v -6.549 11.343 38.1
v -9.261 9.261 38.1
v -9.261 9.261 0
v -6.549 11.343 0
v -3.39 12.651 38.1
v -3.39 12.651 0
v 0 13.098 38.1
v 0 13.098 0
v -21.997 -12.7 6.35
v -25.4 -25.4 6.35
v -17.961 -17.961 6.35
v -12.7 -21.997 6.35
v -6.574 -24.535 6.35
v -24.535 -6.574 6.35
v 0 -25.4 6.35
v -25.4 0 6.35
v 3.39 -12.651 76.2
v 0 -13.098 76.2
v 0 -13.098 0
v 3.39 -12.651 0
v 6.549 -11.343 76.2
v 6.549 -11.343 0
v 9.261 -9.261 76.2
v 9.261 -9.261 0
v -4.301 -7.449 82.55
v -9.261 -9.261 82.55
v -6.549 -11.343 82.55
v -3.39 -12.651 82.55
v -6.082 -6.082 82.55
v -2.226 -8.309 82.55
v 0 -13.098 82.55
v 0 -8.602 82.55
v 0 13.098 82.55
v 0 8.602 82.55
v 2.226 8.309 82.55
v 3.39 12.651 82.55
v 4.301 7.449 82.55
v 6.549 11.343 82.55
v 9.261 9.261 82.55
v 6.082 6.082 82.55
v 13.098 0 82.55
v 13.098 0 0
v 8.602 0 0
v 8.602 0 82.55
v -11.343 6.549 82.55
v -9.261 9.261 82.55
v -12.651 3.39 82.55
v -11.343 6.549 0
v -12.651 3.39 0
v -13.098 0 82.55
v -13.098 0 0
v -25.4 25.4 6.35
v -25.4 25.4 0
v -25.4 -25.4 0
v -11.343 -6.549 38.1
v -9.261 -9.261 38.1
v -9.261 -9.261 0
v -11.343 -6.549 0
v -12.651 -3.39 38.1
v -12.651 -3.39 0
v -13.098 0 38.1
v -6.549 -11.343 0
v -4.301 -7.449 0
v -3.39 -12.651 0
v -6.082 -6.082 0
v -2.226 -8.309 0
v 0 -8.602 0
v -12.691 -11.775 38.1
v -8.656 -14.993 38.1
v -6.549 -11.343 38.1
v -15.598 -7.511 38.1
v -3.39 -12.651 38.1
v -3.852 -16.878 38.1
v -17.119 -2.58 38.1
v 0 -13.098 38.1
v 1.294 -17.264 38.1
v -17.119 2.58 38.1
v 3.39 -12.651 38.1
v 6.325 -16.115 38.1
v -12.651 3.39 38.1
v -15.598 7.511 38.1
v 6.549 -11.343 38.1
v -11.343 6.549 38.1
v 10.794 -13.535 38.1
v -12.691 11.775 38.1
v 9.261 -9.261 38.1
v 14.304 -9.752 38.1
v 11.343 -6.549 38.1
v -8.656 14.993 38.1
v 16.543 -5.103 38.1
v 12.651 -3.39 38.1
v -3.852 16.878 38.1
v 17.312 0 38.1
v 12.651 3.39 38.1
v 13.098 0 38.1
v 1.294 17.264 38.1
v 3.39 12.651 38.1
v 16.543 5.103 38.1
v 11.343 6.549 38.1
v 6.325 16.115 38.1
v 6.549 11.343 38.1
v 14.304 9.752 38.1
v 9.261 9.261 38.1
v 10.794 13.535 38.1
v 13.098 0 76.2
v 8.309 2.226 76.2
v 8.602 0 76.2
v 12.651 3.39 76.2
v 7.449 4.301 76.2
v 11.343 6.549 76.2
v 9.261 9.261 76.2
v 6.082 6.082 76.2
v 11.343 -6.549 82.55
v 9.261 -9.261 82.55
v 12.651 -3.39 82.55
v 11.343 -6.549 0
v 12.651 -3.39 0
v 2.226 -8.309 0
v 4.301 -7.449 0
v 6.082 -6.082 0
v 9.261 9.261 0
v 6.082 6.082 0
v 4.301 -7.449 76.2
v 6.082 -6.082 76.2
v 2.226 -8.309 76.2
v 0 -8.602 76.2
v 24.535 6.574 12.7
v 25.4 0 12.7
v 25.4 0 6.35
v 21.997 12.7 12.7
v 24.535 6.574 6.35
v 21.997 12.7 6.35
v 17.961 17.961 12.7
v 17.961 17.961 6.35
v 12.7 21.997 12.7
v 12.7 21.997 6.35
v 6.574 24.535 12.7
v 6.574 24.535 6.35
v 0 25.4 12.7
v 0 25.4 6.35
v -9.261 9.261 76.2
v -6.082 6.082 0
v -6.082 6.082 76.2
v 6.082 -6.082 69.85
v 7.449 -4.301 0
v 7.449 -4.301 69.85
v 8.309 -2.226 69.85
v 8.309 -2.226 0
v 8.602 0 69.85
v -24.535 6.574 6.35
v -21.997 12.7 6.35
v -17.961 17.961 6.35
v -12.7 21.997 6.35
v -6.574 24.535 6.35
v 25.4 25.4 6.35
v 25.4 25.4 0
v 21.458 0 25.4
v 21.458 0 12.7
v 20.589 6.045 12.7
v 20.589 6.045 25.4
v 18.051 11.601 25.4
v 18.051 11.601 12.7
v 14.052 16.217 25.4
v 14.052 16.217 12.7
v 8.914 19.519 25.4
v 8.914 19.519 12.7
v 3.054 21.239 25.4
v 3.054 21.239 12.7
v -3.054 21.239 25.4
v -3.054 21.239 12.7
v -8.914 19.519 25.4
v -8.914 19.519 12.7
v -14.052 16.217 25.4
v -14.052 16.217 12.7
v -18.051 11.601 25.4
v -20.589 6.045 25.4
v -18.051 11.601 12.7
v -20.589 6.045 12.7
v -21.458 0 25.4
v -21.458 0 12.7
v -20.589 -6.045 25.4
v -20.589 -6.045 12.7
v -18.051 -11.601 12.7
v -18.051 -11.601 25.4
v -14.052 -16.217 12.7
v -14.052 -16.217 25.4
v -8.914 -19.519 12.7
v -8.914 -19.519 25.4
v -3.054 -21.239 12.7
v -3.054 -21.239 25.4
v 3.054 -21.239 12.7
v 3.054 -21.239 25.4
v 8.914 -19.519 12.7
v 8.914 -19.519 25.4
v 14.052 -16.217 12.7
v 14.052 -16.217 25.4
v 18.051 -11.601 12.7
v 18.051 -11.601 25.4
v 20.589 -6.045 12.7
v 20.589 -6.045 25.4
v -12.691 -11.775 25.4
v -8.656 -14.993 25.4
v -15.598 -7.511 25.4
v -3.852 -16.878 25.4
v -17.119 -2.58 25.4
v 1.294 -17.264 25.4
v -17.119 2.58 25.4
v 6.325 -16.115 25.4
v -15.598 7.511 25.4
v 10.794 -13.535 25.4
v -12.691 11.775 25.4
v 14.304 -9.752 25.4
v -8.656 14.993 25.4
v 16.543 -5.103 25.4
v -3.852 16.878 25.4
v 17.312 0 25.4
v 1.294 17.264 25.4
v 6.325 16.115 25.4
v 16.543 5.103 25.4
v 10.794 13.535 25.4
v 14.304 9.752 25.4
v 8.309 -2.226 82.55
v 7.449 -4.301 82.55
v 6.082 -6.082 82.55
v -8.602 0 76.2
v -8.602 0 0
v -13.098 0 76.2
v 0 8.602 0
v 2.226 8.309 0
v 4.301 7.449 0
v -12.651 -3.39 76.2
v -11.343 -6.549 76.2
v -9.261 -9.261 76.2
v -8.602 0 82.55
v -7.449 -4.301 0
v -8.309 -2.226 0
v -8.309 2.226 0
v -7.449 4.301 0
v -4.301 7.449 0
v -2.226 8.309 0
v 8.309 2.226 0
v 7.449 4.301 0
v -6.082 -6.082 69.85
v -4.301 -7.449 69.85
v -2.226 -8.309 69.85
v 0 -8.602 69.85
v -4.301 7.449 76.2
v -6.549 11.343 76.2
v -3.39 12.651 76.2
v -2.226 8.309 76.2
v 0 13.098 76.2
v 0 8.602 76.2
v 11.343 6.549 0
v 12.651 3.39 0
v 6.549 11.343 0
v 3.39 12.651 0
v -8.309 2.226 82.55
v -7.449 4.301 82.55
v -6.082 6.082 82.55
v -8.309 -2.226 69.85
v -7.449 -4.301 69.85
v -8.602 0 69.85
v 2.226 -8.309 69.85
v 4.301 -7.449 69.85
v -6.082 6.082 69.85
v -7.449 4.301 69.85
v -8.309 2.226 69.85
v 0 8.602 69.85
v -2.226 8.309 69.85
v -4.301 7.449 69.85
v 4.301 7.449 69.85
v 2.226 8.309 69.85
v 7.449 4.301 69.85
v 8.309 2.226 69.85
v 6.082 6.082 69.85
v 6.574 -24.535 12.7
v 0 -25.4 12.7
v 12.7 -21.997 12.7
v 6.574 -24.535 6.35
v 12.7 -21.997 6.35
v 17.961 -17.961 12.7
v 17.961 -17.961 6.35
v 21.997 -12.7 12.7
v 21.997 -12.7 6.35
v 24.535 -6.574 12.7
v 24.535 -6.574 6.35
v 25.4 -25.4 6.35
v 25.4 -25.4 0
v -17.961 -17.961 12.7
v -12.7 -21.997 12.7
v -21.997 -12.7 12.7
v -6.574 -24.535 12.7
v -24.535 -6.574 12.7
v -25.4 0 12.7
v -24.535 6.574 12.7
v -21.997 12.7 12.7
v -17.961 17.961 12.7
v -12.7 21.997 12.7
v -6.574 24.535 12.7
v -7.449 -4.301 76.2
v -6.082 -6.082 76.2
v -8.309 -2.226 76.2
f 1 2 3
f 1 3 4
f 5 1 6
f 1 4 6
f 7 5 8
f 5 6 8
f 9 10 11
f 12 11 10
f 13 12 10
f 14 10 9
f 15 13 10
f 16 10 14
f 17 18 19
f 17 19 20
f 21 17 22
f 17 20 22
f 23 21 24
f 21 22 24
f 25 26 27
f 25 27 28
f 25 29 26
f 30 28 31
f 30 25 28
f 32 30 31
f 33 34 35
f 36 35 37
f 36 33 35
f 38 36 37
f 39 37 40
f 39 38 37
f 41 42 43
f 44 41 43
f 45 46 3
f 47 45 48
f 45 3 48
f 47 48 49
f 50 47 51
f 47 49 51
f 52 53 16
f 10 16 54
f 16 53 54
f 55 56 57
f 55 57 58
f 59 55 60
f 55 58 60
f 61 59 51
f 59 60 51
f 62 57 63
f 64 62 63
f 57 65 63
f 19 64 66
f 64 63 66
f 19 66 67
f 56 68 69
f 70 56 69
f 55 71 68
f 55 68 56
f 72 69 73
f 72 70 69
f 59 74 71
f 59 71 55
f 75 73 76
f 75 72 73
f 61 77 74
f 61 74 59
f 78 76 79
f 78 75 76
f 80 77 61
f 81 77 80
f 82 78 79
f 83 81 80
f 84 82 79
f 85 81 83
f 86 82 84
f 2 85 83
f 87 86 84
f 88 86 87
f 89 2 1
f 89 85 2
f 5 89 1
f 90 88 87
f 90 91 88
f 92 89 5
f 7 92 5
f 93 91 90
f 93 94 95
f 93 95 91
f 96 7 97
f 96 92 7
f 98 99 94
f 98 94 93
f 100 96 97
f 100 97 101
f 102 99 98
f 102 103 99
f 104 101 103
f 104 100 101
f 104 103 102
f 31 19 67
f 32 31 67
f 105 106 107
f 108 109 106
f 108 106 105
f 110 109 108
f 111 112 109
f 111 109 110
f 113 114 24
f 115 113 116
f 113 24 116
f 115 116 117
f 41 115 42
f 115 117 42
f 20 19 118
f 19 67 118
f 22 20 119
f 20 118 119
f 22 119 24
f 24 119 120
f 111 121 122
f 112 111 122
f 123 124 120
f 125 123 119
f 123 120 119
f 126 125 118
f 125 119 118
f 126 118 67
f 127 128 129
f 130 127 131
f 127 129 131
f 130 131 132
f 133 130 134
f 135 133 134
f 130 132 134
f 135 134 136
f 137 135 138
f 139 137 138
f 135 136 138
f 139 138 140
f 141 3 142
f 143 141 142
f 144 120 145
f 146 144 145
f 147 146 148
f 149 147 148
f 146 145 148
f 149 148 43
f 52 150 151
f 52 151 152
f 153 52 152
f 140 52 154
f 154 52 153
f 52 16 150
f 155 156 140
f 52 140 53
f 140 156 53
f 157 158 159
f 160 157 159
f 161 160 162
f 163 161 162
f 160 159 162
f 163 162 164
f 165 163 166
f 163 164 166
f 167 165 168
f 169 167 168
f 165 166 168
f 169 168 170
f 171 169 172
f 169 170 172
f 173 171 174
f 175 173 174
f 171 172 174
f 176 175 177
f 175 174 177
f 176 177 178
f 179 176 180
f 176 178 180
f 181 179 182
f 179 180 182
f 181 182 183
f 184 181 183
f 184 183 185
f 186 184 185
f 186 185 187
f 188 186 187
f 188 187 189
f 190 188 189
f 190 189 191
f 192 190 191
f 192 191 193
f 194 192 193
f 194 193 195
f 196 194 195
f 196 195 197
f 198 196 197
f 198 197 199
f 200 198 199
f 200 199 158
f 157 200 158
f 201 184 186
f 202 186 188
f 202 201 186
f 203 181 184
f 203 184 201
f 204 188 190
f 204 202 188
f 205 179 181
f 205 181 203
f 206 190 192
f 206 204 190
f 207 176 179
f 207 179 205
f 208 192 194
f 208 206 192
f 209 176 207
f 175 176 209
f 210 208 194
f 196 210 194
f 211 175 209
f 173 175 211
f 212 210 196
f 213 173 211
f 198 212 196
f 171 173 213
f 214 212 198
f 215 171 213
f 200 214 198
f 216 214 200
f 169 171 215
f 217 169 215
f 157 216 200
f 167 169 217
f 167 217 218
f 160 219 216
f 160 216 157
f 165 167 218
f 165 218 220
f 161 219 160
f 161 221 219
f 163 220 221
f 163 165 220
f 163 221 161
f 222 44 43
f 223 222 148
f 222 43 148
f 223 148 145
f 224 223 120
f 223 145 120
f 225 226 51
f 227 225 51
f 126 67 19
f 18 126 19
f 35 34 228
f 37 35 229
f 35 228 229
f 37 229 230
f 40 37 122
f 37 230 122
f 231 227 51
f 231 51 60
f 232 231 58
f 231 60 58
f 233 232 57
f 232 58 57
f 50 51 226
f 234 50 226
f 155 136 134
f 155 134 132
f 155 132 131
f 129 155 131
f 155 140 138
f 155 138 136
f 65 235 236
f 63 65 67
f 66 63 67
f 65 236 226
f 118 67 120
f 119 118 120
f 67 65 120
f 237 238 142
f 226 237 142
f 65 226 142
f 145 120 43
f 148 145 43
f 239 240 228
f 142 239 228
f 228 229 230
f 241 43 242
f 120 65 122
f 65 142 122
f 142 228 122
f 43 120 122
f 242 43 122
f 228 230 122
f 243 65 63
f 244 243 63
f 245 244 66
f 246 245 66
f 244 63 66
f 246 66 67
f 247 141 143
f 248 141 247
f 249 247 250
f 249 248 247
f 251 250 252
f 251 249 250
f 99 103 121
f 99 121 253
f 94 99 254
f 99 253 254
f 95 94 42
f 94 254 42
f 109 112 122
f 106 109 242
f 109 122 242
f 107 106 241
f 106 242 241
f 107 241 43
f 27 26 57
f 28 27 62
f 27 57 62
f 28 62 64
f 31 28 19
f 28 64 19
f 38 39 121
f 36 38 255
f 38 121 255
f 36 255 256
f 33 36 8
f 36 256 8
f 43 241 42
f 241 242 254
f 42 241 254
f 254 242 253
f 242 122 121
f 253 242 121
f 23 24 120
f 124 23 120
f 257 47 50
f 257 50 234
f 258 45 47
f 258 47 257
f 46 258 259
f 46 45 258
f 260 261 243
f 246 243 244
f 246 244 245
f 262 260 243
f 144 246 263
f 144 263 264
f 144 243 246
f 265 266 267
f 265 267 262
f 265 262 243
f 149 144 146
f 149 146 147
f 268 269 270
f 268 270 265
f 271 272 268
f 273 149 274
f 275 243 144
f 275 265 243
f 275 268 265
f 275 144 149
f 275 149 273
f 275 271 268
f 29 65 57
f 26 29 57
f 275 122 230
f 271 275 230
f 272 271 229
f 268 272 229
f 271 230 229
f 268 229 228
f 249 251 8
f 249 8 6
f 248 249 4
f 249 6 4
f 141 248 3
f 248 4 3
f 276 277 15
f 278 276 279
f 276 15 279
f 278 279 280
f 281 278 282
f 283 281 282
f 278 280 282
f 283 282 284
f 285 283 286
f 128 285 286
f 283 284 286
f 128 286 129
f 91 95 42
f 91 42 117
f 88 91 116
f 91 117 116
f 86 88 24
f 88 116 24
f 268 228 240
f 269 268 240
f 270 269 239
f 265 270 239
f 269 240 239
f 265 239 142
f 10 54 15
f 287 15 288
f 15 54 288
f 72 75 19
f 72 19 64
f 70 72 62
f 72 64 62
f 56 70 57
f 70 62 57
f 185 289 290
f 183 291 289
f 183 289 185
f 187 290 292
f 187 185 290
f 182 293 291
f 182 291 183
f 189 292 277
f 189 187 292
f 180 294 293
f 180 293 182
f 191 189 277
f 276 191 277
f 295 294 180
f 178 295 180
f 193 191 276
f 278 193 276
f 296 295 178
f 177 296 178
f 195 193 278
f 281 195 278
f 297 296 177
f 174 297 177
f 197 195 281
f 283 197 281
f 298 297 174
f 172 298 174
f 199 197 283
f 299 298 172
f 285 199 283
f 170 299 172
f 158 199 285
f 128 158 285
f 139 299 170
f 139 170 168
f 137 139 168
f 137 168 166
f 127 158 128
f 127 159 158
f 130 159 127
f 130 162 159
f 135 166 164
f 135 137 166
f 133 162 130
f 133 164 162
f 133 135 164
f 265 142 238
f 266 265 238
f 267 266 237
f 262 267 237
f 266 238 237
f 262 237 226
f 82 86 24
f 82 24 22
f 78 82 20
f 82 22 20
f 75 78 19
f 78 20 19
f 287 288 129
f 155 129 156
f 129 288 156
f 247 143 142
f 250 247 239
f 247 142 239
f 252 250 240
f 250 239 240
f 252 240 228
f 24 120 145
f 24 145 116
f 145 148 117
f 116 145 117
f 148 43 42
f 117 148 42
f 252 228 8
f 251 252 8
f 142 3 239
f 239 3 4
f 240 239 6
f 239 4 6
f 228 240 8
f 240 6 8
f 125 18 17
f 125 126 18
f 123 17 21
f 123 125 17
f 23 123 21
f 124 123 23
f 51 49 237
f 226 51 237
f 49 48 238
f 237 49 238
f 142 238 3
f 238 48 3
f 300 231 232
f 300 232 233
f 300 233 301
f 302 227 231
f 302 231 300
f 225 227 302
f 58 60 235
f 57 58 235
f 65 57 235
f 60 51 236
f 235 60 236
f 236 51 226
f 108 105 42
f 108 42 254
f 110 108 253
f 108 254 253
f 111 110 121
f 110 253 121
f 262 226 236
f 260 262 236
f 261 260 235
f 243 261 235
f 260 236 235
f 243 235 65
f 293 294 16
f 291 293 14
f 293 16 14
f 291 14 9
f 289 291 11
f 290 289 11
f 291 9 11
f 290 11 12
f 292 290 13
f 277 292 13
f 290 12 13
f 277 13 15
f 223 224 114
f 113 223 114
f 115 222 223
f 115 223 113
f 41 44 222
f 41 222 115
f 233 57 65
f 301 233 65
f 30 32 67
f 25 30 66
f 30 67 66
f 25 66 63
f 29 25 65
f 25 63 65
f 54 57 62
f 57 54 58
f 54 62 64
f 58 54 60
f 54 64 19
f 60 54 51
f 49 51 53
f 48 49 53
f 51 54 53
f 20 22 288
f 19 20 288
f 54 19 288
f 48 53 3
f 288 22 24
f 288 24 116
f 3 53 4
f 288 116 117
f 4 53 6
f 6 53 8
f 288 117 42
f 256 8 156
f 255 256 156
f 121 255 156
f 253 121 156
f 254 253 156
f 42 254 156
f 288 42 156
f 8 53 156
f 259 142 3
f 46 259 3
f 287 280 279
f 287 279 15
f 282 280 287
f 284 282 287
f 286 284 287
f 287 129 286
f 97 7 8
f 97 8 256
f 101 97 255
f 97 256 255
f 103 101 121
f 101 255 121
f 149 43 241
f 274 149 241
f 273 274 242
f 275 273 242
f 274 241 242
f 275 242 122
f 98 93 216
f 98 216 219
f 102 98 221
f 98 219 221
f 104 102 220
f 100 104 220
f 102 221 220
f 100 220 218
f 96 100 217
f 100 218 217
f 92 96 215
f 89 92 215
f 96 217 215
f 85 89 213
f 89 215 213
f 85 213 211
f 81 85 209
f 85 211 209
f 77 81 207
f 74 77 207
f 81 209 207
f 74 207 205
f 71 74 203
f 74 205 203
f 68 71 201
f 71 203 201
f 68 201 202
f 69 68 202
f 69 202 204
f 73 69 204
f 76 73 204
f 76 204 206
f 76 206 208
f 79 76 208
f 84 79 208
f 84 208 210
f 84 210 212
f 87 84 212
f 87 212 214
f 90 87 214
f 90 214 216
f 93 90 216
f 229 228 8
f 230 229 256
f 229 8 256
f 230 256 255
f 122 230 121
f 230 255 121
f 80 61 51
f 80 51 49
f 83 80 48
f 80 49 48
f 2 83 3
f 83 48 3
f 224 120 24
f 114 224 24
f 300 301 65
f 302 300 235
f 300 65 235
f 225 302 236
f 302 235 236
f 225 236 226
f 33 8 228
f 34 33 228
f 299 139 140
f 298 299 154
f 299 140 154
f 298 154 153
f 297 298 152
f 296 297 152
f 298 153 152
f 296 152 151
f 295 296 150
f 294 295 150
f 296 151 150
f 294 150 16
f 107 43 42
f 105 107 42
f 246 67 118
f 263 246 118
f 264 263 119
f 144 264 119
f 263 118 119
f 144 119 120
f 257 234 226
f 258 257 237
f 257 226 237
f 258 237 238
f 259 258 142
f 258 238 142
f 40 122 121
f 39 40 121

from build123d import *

# Parameters (mm, degrees)
F1_DEPTH = 6.35
F0_R     = 21.457702
F2_DEPTH = 12.7
F0_R_2   = 17.312031
F3_DEPTH = 25.4
F4_DEPTH = 38.1
F5_DEPTH = 69.85
F6_DEPTH = 76.2
F7_DEPTH = 82.55


with BuildPart() as f1:
    # F0 (on Top) → F1 (new body)
    with BuildSketch(Plane.XY):
        with BuildLine():
            ThreePointArc((0, -25.4), (-17.960512, -17.960512), (-25.4, 0))
            Line((-25.4, 0), (-25.4, -25.4))
            Line((-25.4, -25.4), (0, -25.4))
        make_face()
        with BuildLine():
            ThreePointArc((-25.4, 0), (-17.960512, 17.960512), (0, 25.4))
            Line((0, 25.4), (-25.4, 25.4))
            Line((-25.4, 25.4), (-25.4, 0))
        make_face()
        with BuildLine():
            Line((25.4, 0), (25.4, 25.4))
            Line((25.4, 25.4), (0, 25.4))
            ThreePointArc((0, 25.4), (17.960512, 17.960512), (25.4, 0))
        make_face()
        with BuildLine():
            Line((25.4, -25.4), (25.4, 0))
            ThreePointArc((25.4, 0), (17.960512, -17.960512), (0, -25.4))
            Line((0, -25.4), (25.4, -25.4))
        make_face()
    extrude(amount=F1_DEPTH)

    # F0 (on Top) → F2 (join)
    with BuildSketch(Plane.XY):
        with BuildLine():
            ThreePointArc((25.4, 0), (17.960512, 17.960512), (0, 25.4))
            ThreePointArc((0, 25.4), (-17.960512, 17.960512), (-25.4, 0))
            ThreePointArc((-25.4, 0), (-17.960512, -17.960512), (0, -25.4))
            ThreePointArc((0, -25.4), (17.960512, -17.960512), (25.4, 0))
        make_face()
        Circle(F0_R, mode=Mode.SUBTRACT)
    extrude(amount=F2_DEPTH)

    # F0 (on Top) → F3 (join)
    with BuildSketch(Plane.XY):
        Circle(F0_R)
        Circle(F0_R_2, mode=Mode.SUBTRACT)
    extrude(amount=F3_DEPTH)

    # F0 (on Top) → F4 (join)
    with BuildSketch(Plane.XY):
        Circle(F0_R_2)
        with BuildLine():
            ThreePointArc((9.261436, 9.261436), (12.100649, 5.012253), (13.097648, 0))
            ThreePointArc((13.097648, 0), (12.100649, -5.012253), (9.261436, -9.261436))
            ThreePointArc((9.261436, -9.261436), (5.012253, -12.100649), (0, -13.097648))
            ThreePointArc((0, -13.097648), (-5.012253, -12.100649), (-9.261436, -9.261436))
            ThreePointArc((-9.261436, -9.261436), (-12.100649, -5.012253), (-13.097648, 0))
            ThreePointArc((-13.097648, 0), (-12.100649, 5.012253), (-9.261436, 9.261436))
            ThreePointArc((-9.261436, 9.261436), (-5.012253, 12.100649), (0, 13.097648))
            ThreePointArc((0, 13.097648), (5.012253, 12.100649), (9.261436, 9.261436))
        make_face(mode=Mode.SUBTRACT)
    extrude(amount=F4_DEPTH)


with BuildPart() as f5:
    # F0 (on Top) → F5 (new body)
    with BuildSketch(Plane.XY):
        with BuildLine():
            ThreePointArc((6.082425, -6.082425), (7.947072, -3.291785), (8.601848, 0))
            ThreePointArc((8.601848, 0), (7.947072, 3.291785), (6.082425, 6.082425))
            ThreePointArc((6.082425, 6.082425), (3.291785, 7.947072), (0, 8.601848))
            ThreePointArc((0, 8.601848), (-3.291785, 7.947072), (-6.082425, 6.082425))
            ThreePointArc((-6.082425, 6.082425), (-7.947072, 3.291785), (-8.601848, 0))
            ThreePointArc((-8.601848, 0), (-7.947072, -3.291785), (-6.082425, -6.082425))
            ThreePointArc((-6.082425, -6.082425), (-3.291785, -7.947072), (0, -8.601848))
            ThreePointArc((0, -8.601848), (3.291785, -7.947072), (6.082425, -6.082425))
        make_face()
    extrude(amount=F5_DEPTH)


with BuildPart() as f6:
    # F0 (on Top) → F6 (new body)
    with BuildSketch(Plane.XY):
        with BuildLine():
            Line((0, 8.601848), (0, 13.097648))
            ThreePointArc((0, 13.097648), (-5.012253, 12.100649), (-9.261436, 9.261436))
            Line((-9.261436, 9.261436), (-6.082425, 6.082425))
            ThreePointArc((-6.082425, 6.082425), (-3.291785, 7.947072), (0, 8.601848))
        make_face()
        with BuildLine():
            Line((8.601848, 0), (13.097648, 0))
            ThreePointArc((13.097648, 0), (12.100649, 5.012253), (9.261436, 9.261436))
            Line((9.261436, 9.261436), (6.082425, 6.082425))
            ThreePointArc((6.082425, 6.082425), (7.947072, 3.291785), (8.601848, 0))
        make_face()
        with BuildLine():
            ThreePointArc((0, -13.097648), (5.012253, -12.100649), (9.261436, -9.261436))
            Line((9.261436, -9.261436), (6.082425, -6.082425))
            ThreePointArc((6.082425, -6.082425), (3.291785, -7.947072), (0, -8.601848))
            Line((0, -8.601848), (0, -13.097648))
        make_face()
        with BuildLine():
            ThreePointArc((-13.097648, 0), (-12.100649, -5.012253), (-9.261436, -9.261436))
            Line((-9.261436, -9.261436), (-6.082425, -6.082425))
            ThreePointArc((-6.082425, -6.082425), (-7.947072, -3.291785), (-8.601848, 0))
            Line((-8.601848, 0), (-13.097648, 0))
        make_face()
    extrude(amount=F6_DEPTH)


with BuildPart() as f7:
    # F0 (on Top) → F7 (new body)
    with BuildSketch(Plane.XY):
        with BuildLine():
            Line((-6.082425, 6.082425), (-9.261436, 9.261436))
            ThreePointArc((-9.261436, 9.261436), (-12.100649, 5.012253), (-13.097648, 0))
            Line((-13.097648, 0), (-8.601848, 0))
            ThreePointArc((-8.601848, 0), (-7.947072, 3.291785), (-6.082425, 6.082425))
        make_face()
        with BuildLine():
            Line((6.082425, 6.082425), (9.261436, 9.261436))
            ThreePointArc((9.261436, 9.261436), (5.012253, 12.100649), (0, 13.097648))
            Line((0, 13.097648), (0, 8.601848))
            ThreePointArc((0, 8.601848), (3.291785, 7.947072), (6.082425, 6.082425))
        make_face()
        with BuildLine():
            ThreePointArc((9.261436, -9.261436), (12.100649, -5.012253), (13.097648, 0))
            Line((13.097648, 0), (8.601848, 0))
            ThreePointArc((8.601848, 0), (7.947072, -3.291785), (6.082425, -6.082425))
            Line((6.082425, -6.082425), (9.261436, -9.261436))
        make_face()
        with BuildLine():
            ThreePointArc((-9.261436, -9.261436), (-5.012253, -12.100649), (0, -13.097648))
            Line((0, -13.097648), (0, -8.601848))
            ThreePointArc((0, -8.601848), (-3.291785, -7.947072), (-6.082425, -6.082425))
            Line((-6.082425, -6.082425), (-9.261436, -9.261436))
        make_face()
    extrude(amount=F7_DEPTH)


solid = Compound([f1.part, f5.part, f6.part, f7.part])
